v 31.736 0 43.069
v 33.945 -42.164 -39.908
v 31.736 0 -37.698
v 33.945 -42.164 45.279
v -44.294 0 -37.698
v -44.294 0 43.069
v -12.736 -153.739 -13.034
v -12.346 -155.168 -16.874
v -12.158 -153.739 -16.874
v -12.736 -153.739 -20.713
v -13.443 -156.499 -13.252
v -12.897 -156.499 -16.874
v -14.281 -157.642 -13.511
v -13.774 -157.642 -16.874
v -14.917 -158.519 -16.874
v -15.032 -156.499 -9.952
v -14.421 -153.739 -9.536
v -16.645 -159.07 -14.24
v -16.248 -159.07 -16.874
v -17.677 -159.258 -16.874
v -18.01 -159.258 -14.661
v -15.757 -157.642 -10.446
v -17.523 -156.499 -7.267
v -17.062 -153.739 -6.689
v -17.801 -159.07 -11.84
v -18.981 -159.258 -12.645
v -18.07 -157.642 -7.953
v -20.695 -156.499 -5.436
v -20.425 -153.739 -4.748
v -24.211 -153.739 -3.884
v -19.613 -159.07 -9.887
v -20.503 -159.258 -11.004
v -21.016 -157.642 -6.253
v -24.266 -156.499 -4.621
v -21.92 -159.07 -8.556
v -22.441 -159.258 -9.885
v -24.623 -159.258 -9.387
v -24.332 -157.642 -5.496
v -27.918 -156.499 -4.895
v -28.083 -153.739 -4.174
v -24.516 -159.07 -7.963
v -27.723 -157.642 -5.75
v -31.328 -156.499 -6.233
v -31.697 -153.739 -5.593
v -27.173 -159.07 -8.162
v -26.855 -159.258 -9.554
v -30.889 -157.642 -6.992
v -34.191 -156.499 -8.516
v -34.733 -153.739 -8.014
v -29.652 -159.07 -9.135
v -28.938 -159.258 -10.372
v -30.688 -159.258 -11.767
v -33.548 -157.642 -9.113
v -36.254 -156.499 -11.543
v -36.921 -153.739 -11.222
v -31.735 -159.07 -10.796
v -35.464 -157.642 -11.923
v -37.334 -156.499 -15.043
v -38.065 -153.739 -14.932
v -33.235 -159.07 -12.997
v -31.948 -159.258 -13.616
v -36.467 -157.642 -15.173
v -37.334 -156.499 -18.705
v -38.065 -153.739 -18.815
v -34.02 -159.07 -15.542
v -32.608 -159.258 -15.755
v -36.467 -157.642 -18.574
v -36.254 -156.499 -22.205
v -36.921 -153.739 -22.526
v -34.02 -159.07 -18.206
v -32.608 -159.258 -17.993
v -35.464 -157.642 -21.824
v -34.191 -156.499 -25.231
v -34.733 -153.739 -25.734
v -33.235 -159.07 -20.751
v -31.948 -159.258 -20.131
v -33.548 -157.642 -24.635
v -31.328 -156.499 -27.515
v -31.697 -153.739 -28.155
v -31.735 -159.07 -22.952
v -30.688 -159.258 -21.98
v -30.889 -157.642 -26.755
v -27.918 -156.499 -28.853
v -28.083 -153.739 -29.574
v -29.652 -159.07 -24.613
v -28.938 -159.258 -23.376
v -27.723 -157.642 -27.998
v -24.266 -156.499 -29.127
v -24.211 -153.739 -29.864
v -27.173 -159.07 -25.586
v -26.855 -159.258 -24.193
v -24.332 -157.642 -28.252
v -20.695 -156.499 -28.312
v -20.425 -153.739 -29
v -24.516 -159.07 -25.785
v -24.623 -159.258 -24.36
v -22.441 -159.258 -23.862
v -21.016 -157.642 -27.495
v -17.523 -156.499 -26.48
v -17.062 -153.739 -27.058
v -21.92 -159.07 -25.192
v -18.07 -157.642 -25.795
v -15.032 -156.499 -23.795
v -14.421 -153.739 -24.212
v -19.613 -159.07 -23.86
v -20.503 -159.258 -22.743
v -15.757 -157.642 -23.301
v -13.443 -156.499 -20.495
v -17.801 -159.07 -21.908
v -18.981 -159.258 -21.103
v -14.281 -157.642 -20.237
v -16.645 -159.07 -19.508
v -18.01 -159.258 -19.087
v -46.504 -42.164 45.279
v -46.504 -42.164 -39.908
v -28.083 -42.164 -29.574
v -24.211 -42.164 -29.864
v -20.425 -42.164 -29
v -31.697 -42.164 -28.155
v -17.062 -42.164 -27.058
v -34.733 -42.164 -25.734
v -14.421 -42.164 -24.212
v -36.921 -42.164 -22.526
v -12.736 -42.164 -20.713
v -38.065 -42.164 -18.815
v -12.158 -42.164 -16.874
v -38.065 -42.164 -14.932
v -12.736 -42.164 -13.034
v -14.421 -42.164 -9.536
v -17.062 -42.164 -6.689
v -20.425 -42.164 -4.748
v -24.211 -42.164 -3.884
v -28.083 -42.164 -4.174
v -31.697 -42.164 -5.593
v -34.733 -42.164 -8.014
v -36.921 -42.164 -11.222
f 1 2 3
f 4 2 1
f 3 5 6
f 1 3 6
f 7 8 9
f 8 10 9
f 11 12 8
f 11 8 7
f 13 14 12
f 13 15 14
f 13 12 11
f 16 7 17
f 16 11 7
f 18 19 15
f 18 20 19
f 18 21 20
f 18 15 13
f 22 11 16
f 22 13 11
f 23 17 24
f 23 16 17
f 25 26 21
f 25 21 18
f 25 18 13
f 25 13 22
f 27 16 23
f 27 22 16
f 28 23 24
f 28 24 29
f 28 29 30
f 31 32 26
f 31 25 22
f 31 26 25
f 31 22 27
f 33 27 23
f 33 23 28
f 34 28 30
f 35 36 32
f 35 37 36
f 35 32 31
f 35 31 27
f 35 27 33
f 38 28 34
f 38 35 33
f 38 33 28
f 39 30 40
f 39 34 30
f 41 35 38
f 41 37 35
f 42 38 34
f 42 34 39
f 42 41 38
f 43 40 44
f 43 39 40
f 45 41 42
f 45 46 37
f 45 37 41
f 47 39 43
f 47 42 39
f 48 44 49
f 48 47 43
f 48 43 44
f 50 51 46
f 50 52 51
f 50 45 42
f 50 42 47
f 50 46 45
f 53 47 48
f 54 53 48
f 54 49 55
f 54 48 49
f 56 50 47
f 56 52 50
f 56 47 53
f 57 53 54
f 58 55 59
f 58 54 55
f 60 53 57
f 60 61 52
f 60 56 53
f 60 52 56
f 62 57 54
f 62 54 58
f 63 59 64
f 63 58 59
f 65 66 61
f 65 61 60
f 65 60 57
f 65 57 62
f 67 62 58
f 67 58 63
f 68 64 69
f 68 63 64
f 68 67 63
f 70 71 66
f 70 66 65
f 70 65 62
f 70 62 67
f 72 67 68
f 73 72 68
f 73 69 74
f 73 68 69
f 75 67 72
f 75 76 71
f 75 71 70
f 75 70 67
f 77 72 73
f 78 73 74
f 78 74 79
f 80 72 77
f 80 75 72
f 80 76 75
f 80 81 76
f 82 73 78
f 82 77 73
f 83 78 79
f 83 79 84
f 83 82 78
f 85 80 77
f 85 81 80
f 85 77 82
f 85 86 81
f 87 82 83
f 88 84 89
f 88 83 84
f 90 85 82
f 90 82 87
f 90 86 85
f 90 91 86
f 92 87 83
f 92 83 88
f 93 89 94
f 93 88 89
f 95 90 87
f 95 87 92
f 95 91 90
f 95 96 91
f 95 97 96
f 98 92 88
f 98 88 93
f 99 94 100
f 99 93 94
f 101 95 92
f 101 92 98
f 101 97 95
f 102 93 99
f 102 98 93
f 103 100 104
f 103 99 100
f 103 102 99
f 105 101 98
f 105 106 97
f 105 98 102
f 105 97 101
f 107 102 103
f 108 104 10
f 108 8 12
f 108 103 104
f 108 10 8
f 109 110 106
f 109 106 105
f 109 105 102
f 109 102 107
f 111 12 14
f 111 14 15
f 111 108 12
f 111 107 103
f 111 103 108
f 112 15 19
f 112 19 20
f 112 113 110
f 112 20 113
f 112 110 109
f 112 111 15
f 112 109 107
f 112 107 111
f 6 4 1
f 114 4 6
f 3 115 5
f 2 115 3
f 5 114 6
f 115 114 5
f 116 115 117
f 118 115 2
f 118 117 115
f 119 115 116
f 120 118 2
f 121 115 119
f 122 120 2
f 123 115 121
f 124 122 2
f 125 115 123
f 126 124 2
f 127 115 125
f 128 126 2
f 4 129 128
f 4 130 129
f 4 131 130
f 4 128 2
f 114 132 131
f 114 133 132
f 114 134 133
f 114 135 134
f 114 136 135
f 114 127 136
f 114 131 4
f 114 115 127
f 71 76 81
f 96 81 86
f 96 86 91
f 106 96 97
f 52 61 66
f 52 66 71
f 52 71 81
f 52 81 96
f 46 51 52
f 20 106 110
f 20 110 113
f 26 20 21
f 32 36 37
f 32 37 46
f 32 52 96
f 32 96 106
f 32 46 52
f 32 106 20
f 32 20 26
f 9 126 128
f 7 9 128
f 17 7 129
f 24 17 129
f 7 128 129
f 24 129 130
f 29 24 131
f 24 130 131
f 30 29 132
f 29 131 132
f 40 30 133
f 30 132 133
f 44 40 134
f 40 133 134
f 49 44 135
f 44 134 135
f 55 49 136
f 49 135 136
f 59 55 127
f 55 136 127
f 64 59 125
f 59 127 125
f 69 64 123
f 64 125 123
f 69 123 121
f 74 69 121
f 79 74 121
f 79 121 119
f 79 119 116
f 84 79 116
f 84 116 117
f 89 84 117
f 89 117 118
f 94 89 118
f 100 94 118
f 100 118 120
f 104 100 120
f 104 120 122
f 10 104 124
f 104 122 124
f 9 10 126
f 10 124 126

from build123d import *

# Parameters (mm, degrees)
F0_W     = 76.0293379426
F0_H     = 80.7674229145
F1_DEPTH = 42.164
F1_TAPER = -3
F2_R     = 13.0264691776
F3_DEPTH = 117.094
F4_R     = 5.5188922036


with BuildPart() as f1:
    # F0 (on Front) → F1 (new body)
    with BuildSketch(Plane.XZ):
        with Locations((-6.2791183591, 2.6857145131)):
            Rectangle(F0_W, F0_H)
    extrude(amount=F1_DEPTH, taper=F1_TAPER)

    # F2 (on face) → F3 (join)
    with BuildSketch(Plane.XZ.offset(42.164)):
        with Locations((-25.1841899008, -16.8737992644)):
            Circle(F2_R)
    extrude(amount=F3_DEPTH)

    # F4
    f4_edges = [f1.edges().sort_by_distance(p)[0] for p in [
        (-38.210659, -159.258, -16.873799),
    ]]
    fillet(f4_edges, radius=F4_R)


solid = f1.part
